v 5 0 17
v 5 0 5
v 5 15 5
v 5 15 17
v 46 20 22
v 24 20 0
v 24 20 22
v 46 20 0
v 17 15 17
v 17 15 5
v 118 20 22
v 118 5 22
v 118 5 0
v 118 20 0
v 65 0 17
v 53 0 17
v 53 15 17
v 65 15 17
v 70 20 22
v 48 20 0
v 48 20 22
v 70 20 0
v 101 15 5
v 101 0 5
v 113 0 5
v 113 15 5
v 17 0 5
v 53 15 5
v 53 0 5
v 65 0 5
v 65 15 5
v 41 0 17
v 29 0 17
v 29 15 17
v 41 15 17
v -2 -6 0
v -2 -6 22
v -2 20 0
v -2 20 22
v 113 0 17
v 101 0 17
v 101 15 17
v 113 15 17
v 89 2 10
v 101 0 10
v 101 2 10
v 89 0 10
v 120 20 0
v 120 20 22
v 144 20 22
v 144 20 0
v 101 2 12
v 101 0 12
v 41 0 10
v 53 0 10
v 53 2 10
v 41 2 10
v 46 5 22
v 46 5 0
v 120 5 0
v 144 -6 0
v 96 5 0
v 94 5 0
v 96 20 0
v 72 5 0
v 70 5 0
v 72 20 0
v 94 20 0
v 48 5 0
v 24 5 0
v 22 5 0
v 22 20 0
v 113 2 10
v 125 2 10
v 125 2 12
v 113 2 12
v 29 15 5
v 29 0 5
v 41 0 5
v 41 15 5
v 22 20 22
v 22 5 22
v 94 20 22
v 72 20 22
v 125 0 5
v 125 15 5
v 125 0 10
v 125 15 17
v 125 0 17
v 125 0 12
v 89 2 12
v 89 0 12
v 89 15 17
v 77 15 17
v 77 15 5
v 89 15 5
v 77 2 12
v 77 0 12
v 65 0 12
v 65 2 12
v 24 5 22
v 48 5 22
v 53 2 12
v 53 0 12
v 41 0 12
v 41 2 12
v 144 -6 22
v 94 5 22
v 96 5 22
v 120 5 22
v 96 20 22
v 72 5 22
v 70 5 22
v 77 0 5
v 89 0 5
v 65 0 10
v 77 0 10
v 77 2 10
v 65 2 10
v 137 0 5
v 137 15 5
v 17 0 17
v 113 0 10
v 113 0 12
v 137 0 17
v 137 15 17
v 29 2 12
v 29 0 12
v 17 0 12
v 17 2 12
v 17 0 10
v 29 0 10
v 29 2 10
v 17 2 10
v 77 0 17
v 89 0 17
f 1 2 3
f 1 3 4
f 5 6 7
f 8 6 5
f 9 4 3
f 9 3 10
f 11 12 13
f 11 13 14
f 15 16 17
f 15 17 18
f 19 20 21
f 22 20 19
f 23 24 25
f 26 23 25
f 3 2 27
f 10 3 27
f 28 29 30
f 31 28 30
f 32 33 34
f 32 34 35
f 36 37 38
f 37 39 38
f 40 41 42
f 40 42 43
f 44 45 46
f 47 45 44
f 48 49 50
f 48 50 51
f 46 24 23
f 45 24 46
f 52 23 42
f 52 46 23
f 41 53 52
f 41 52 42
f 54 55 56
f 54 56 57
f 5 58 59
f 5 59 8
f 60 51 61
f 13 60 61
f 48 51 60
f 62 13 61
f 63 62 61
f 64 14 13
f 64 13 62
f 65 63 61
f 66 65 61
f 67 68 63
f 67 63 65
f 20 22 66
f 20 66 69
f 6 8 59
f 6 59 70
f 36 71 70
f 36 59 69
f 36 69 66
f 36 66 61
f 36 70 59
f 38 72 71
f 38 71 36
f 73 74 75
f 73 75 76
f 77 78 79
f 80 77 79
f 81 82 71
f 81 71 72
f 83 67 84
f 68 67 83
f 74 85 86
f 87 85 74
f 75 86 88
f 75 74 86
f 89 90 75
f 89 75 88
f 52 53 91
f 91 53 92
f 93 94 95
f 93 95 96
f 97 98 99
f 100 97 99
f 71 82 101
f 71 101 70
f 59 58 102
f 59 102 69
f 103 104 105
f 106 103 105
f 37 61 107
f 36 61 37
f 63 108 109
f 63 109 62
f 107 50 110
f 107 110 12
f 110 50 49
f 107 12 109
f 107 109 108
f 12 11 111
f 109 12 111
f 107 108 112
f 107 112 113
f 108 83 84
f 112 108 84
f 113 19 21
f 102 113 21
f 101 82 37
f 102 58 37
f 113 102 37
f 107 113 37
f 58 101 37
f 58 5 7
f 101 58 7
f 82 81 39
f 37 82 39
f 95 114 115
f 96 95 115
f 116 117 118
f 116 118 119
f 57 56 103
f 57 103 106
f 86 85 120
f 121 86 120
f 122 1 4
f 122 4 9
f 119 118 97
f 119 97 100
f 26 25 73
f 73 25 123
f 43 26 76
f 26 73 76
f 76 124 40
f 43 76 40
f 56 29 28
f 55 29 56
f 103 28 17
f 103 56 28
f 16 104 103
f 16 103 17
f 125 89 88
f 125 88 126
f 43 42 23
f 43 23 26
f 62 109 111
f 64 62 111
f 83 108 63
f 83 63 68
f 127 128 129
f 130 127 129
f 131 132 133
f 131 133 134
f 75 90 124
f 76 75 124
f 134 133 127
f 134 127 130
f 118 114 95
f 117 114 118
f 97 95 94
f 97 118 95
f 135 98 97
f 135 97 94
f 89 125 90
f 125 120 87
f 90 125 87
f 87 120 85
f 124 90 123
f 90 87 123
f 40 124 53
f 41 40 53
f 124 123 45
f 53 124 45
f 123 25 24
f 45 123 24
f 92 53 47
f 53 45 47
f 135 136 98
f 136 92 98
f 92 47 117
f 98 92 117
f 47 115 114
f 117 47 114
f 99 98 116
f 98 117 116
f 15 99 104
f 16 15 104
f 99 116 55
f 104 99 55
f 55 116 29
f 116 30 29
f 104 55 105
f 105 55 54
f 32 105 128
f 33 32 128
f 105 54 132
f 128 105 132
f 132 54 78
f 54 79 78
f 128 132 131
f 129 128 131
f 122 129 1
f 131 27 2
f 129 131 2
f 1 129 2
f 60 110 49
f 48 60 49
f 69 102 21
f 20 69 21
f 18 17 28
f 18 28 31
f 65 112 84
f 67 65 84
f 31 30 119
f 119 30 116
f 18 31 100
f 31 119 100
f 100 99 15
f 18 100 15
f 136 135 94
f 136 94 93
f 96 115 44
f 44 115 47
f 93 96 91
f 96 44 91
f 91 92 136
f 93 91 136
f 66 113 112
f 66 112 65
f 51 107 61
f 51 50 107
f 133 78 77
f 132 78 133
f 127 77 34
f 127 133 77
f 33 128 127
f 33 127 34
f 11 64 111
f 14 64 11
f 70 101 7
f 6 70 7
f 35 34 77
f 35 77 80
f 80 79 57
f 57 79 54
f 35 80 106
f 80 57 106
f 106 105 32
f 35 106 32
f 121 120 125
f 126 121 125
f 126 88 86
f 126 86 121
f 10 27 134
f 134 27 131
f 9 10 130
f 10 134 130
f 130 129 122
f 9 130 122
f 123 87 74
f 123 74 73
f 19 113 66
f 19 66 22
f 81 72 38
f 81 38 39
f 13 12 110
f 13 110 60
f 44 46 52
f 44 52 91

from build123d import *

# Parameters (mm, degrees)
SKETCH1_W           = 22
SKETCH1_H           = 20
BOSS_EXTRUDE1_DEPTH = 22
SKETCH2_W           = 12
SKETCH2_H           = 12
CUT_EXTRUDE1_DEPTH  = 15
SKETCH3_W           = 22
SKETCH3_H           = 5
BOSS_EXTRUDE2_DEPTH = 2
LPATTERN1_COUNT     = 6
LPATTERN1_PITCH     = 24
SKETCH4_W           = 22
SKETCH4_H           = 15
BOSS_EXTRUDE3_DEPTH = 2
SKETCH5_W           = 22
SKETCH5_H           = 20
BOSS_EXTRUDE4_DEPTH = 2
SKETCH6_W           = 132
SKETCH6_H           = 2
CUT_EXTRUDE2_DEPTH  = 2
SKETCH7_W           = 146
SKETCH7_H           = 22
BOSS_EXTRUDE5_DEPTH = 6


with BuildPart() as part:
    # Sketch1 → Boss-Extrude1 (new body)
    with BuildSketch(Plane.XY):
        with Locations((11, 10)):
            Rectangle(SKETCH1_W, SKETCH1_H)
    extrude(amount=BOSS_EXTRUDE1_DEPTH)

    # Sketch2 → Cut-Extrude1 (cut)
    with BuildSketch(Plane.XZ):
        with Locations((11, 11)):
            Rectangle(SKETCH2_W, SKETCH2_H)
    extrude(amount=-CUT_EXTRUDE1_DEPTH, mode=Mode.SUBTRACT)

    # Sketch3 → Boss-Extrude2 (add)
    with BuildSketch(Plane(origin=(22, 0, 0), x_dir=(0, 0, -1), z_dir=(1, 0, 0))):
        with Locations((-11, 2.5)):
            Rectangle(SKETCH3_W, SKETCH3_H)
    extrude(amount=BOSS_EXTRUDE2_DEPTH)


with BuildPart() as lpattern1_1:
    # LPattern1: pattern copy
    add(part.part.moved(Location(Vector(1, 0, 0) * (1 * LPATTERN1_PITCH))))


with BuildPart() as lpattern1_2:
    # LPattern1: pattern copy
    add(part.part.moved(Location(Vector(1, 0, 0) * (2 * LPATTERN1_PITCH))))


with BuildPart() as lpattern1_3:
    # LPattern1: pattern copy
    add(part.part.moved(Location(Vector(1, 0, 0) * (3 * LPATTERN1_PITCH))))


with BuildPart() as lpattern1_4:
    # LPattern1: pattern copy
    add(part.part.moved(Location(Vector(1, 0, 0) * (4 * LPATTERN1_PITCH))))


with BuildPart() as lpattern1_5:
    # LPattern1: pattern copy
    add(part.part.moved(Location(Vector(1, 0, 0) * (5 * LPATTERN1_PITCH))))


with BuildPart() as lpattern1_2_1:
    add(lpattern1_2.part)

    # Combine1: union LPattern1_3, LPattern1_4, LPattern1_5, LPattern1_1, part
    add(lpattern1_3.part)
    add(lpattern1_4.part)
    add(lpattern1_5.part)
    add(lpattern1_1.part)
    add(part.part)

    # Sketch4 → Boss-Extrude3 (add)
    with BuildSketch(Plane(origin=(142, 0, 0), x_dir=(0, 0, -1), z_dir=(1, 0, 0))):
        with Locations((-11, 12.5)):
            Rectangle(SKETCH4_W, SKETCH4_H)
    extrude(amount=BOSS_EXTRUDE3_DEPTH)

    # Sketch5 → Boss-Extrude4 (add)
    with BuildSketch(Plane.ZY):
        with Locations((11, 10)):
            Rectangle(SKETCH5_W, SKETCH5_H)
    extrude(amount=BOSS_EXTRUDE4_DEPTH)

    # Sketch6 → Cut-Extrude2 (cut)
    with BuildSketch(Plane(origin=(0, 0, 0), x_dir=(-1, 0, 0), z_dir=(0, -1, 0))):
        with Locations((-71, -11)):
            Rectangle(SKETCH6_W, SKETCH6_H)
    extrude(amount=-CUT_EXTRUDE2_DEPTH, mode=Mode.SUBTRACT)

    # Sketch7 → Boss-Extrude5 (add)
    with BuildSketch(Plane(origin=(0, 0, 0), x_dir=(-1, 0, 0), z_dir=(0, -1, 0))):
        with Locations((-71, -11)):
            Rectangle(SKETCH7_W, SKETCH7_H)
    extrude(amount=BOSS_EXTRUDE5_DEPTH)


solid = lpattern1_2_1.part
